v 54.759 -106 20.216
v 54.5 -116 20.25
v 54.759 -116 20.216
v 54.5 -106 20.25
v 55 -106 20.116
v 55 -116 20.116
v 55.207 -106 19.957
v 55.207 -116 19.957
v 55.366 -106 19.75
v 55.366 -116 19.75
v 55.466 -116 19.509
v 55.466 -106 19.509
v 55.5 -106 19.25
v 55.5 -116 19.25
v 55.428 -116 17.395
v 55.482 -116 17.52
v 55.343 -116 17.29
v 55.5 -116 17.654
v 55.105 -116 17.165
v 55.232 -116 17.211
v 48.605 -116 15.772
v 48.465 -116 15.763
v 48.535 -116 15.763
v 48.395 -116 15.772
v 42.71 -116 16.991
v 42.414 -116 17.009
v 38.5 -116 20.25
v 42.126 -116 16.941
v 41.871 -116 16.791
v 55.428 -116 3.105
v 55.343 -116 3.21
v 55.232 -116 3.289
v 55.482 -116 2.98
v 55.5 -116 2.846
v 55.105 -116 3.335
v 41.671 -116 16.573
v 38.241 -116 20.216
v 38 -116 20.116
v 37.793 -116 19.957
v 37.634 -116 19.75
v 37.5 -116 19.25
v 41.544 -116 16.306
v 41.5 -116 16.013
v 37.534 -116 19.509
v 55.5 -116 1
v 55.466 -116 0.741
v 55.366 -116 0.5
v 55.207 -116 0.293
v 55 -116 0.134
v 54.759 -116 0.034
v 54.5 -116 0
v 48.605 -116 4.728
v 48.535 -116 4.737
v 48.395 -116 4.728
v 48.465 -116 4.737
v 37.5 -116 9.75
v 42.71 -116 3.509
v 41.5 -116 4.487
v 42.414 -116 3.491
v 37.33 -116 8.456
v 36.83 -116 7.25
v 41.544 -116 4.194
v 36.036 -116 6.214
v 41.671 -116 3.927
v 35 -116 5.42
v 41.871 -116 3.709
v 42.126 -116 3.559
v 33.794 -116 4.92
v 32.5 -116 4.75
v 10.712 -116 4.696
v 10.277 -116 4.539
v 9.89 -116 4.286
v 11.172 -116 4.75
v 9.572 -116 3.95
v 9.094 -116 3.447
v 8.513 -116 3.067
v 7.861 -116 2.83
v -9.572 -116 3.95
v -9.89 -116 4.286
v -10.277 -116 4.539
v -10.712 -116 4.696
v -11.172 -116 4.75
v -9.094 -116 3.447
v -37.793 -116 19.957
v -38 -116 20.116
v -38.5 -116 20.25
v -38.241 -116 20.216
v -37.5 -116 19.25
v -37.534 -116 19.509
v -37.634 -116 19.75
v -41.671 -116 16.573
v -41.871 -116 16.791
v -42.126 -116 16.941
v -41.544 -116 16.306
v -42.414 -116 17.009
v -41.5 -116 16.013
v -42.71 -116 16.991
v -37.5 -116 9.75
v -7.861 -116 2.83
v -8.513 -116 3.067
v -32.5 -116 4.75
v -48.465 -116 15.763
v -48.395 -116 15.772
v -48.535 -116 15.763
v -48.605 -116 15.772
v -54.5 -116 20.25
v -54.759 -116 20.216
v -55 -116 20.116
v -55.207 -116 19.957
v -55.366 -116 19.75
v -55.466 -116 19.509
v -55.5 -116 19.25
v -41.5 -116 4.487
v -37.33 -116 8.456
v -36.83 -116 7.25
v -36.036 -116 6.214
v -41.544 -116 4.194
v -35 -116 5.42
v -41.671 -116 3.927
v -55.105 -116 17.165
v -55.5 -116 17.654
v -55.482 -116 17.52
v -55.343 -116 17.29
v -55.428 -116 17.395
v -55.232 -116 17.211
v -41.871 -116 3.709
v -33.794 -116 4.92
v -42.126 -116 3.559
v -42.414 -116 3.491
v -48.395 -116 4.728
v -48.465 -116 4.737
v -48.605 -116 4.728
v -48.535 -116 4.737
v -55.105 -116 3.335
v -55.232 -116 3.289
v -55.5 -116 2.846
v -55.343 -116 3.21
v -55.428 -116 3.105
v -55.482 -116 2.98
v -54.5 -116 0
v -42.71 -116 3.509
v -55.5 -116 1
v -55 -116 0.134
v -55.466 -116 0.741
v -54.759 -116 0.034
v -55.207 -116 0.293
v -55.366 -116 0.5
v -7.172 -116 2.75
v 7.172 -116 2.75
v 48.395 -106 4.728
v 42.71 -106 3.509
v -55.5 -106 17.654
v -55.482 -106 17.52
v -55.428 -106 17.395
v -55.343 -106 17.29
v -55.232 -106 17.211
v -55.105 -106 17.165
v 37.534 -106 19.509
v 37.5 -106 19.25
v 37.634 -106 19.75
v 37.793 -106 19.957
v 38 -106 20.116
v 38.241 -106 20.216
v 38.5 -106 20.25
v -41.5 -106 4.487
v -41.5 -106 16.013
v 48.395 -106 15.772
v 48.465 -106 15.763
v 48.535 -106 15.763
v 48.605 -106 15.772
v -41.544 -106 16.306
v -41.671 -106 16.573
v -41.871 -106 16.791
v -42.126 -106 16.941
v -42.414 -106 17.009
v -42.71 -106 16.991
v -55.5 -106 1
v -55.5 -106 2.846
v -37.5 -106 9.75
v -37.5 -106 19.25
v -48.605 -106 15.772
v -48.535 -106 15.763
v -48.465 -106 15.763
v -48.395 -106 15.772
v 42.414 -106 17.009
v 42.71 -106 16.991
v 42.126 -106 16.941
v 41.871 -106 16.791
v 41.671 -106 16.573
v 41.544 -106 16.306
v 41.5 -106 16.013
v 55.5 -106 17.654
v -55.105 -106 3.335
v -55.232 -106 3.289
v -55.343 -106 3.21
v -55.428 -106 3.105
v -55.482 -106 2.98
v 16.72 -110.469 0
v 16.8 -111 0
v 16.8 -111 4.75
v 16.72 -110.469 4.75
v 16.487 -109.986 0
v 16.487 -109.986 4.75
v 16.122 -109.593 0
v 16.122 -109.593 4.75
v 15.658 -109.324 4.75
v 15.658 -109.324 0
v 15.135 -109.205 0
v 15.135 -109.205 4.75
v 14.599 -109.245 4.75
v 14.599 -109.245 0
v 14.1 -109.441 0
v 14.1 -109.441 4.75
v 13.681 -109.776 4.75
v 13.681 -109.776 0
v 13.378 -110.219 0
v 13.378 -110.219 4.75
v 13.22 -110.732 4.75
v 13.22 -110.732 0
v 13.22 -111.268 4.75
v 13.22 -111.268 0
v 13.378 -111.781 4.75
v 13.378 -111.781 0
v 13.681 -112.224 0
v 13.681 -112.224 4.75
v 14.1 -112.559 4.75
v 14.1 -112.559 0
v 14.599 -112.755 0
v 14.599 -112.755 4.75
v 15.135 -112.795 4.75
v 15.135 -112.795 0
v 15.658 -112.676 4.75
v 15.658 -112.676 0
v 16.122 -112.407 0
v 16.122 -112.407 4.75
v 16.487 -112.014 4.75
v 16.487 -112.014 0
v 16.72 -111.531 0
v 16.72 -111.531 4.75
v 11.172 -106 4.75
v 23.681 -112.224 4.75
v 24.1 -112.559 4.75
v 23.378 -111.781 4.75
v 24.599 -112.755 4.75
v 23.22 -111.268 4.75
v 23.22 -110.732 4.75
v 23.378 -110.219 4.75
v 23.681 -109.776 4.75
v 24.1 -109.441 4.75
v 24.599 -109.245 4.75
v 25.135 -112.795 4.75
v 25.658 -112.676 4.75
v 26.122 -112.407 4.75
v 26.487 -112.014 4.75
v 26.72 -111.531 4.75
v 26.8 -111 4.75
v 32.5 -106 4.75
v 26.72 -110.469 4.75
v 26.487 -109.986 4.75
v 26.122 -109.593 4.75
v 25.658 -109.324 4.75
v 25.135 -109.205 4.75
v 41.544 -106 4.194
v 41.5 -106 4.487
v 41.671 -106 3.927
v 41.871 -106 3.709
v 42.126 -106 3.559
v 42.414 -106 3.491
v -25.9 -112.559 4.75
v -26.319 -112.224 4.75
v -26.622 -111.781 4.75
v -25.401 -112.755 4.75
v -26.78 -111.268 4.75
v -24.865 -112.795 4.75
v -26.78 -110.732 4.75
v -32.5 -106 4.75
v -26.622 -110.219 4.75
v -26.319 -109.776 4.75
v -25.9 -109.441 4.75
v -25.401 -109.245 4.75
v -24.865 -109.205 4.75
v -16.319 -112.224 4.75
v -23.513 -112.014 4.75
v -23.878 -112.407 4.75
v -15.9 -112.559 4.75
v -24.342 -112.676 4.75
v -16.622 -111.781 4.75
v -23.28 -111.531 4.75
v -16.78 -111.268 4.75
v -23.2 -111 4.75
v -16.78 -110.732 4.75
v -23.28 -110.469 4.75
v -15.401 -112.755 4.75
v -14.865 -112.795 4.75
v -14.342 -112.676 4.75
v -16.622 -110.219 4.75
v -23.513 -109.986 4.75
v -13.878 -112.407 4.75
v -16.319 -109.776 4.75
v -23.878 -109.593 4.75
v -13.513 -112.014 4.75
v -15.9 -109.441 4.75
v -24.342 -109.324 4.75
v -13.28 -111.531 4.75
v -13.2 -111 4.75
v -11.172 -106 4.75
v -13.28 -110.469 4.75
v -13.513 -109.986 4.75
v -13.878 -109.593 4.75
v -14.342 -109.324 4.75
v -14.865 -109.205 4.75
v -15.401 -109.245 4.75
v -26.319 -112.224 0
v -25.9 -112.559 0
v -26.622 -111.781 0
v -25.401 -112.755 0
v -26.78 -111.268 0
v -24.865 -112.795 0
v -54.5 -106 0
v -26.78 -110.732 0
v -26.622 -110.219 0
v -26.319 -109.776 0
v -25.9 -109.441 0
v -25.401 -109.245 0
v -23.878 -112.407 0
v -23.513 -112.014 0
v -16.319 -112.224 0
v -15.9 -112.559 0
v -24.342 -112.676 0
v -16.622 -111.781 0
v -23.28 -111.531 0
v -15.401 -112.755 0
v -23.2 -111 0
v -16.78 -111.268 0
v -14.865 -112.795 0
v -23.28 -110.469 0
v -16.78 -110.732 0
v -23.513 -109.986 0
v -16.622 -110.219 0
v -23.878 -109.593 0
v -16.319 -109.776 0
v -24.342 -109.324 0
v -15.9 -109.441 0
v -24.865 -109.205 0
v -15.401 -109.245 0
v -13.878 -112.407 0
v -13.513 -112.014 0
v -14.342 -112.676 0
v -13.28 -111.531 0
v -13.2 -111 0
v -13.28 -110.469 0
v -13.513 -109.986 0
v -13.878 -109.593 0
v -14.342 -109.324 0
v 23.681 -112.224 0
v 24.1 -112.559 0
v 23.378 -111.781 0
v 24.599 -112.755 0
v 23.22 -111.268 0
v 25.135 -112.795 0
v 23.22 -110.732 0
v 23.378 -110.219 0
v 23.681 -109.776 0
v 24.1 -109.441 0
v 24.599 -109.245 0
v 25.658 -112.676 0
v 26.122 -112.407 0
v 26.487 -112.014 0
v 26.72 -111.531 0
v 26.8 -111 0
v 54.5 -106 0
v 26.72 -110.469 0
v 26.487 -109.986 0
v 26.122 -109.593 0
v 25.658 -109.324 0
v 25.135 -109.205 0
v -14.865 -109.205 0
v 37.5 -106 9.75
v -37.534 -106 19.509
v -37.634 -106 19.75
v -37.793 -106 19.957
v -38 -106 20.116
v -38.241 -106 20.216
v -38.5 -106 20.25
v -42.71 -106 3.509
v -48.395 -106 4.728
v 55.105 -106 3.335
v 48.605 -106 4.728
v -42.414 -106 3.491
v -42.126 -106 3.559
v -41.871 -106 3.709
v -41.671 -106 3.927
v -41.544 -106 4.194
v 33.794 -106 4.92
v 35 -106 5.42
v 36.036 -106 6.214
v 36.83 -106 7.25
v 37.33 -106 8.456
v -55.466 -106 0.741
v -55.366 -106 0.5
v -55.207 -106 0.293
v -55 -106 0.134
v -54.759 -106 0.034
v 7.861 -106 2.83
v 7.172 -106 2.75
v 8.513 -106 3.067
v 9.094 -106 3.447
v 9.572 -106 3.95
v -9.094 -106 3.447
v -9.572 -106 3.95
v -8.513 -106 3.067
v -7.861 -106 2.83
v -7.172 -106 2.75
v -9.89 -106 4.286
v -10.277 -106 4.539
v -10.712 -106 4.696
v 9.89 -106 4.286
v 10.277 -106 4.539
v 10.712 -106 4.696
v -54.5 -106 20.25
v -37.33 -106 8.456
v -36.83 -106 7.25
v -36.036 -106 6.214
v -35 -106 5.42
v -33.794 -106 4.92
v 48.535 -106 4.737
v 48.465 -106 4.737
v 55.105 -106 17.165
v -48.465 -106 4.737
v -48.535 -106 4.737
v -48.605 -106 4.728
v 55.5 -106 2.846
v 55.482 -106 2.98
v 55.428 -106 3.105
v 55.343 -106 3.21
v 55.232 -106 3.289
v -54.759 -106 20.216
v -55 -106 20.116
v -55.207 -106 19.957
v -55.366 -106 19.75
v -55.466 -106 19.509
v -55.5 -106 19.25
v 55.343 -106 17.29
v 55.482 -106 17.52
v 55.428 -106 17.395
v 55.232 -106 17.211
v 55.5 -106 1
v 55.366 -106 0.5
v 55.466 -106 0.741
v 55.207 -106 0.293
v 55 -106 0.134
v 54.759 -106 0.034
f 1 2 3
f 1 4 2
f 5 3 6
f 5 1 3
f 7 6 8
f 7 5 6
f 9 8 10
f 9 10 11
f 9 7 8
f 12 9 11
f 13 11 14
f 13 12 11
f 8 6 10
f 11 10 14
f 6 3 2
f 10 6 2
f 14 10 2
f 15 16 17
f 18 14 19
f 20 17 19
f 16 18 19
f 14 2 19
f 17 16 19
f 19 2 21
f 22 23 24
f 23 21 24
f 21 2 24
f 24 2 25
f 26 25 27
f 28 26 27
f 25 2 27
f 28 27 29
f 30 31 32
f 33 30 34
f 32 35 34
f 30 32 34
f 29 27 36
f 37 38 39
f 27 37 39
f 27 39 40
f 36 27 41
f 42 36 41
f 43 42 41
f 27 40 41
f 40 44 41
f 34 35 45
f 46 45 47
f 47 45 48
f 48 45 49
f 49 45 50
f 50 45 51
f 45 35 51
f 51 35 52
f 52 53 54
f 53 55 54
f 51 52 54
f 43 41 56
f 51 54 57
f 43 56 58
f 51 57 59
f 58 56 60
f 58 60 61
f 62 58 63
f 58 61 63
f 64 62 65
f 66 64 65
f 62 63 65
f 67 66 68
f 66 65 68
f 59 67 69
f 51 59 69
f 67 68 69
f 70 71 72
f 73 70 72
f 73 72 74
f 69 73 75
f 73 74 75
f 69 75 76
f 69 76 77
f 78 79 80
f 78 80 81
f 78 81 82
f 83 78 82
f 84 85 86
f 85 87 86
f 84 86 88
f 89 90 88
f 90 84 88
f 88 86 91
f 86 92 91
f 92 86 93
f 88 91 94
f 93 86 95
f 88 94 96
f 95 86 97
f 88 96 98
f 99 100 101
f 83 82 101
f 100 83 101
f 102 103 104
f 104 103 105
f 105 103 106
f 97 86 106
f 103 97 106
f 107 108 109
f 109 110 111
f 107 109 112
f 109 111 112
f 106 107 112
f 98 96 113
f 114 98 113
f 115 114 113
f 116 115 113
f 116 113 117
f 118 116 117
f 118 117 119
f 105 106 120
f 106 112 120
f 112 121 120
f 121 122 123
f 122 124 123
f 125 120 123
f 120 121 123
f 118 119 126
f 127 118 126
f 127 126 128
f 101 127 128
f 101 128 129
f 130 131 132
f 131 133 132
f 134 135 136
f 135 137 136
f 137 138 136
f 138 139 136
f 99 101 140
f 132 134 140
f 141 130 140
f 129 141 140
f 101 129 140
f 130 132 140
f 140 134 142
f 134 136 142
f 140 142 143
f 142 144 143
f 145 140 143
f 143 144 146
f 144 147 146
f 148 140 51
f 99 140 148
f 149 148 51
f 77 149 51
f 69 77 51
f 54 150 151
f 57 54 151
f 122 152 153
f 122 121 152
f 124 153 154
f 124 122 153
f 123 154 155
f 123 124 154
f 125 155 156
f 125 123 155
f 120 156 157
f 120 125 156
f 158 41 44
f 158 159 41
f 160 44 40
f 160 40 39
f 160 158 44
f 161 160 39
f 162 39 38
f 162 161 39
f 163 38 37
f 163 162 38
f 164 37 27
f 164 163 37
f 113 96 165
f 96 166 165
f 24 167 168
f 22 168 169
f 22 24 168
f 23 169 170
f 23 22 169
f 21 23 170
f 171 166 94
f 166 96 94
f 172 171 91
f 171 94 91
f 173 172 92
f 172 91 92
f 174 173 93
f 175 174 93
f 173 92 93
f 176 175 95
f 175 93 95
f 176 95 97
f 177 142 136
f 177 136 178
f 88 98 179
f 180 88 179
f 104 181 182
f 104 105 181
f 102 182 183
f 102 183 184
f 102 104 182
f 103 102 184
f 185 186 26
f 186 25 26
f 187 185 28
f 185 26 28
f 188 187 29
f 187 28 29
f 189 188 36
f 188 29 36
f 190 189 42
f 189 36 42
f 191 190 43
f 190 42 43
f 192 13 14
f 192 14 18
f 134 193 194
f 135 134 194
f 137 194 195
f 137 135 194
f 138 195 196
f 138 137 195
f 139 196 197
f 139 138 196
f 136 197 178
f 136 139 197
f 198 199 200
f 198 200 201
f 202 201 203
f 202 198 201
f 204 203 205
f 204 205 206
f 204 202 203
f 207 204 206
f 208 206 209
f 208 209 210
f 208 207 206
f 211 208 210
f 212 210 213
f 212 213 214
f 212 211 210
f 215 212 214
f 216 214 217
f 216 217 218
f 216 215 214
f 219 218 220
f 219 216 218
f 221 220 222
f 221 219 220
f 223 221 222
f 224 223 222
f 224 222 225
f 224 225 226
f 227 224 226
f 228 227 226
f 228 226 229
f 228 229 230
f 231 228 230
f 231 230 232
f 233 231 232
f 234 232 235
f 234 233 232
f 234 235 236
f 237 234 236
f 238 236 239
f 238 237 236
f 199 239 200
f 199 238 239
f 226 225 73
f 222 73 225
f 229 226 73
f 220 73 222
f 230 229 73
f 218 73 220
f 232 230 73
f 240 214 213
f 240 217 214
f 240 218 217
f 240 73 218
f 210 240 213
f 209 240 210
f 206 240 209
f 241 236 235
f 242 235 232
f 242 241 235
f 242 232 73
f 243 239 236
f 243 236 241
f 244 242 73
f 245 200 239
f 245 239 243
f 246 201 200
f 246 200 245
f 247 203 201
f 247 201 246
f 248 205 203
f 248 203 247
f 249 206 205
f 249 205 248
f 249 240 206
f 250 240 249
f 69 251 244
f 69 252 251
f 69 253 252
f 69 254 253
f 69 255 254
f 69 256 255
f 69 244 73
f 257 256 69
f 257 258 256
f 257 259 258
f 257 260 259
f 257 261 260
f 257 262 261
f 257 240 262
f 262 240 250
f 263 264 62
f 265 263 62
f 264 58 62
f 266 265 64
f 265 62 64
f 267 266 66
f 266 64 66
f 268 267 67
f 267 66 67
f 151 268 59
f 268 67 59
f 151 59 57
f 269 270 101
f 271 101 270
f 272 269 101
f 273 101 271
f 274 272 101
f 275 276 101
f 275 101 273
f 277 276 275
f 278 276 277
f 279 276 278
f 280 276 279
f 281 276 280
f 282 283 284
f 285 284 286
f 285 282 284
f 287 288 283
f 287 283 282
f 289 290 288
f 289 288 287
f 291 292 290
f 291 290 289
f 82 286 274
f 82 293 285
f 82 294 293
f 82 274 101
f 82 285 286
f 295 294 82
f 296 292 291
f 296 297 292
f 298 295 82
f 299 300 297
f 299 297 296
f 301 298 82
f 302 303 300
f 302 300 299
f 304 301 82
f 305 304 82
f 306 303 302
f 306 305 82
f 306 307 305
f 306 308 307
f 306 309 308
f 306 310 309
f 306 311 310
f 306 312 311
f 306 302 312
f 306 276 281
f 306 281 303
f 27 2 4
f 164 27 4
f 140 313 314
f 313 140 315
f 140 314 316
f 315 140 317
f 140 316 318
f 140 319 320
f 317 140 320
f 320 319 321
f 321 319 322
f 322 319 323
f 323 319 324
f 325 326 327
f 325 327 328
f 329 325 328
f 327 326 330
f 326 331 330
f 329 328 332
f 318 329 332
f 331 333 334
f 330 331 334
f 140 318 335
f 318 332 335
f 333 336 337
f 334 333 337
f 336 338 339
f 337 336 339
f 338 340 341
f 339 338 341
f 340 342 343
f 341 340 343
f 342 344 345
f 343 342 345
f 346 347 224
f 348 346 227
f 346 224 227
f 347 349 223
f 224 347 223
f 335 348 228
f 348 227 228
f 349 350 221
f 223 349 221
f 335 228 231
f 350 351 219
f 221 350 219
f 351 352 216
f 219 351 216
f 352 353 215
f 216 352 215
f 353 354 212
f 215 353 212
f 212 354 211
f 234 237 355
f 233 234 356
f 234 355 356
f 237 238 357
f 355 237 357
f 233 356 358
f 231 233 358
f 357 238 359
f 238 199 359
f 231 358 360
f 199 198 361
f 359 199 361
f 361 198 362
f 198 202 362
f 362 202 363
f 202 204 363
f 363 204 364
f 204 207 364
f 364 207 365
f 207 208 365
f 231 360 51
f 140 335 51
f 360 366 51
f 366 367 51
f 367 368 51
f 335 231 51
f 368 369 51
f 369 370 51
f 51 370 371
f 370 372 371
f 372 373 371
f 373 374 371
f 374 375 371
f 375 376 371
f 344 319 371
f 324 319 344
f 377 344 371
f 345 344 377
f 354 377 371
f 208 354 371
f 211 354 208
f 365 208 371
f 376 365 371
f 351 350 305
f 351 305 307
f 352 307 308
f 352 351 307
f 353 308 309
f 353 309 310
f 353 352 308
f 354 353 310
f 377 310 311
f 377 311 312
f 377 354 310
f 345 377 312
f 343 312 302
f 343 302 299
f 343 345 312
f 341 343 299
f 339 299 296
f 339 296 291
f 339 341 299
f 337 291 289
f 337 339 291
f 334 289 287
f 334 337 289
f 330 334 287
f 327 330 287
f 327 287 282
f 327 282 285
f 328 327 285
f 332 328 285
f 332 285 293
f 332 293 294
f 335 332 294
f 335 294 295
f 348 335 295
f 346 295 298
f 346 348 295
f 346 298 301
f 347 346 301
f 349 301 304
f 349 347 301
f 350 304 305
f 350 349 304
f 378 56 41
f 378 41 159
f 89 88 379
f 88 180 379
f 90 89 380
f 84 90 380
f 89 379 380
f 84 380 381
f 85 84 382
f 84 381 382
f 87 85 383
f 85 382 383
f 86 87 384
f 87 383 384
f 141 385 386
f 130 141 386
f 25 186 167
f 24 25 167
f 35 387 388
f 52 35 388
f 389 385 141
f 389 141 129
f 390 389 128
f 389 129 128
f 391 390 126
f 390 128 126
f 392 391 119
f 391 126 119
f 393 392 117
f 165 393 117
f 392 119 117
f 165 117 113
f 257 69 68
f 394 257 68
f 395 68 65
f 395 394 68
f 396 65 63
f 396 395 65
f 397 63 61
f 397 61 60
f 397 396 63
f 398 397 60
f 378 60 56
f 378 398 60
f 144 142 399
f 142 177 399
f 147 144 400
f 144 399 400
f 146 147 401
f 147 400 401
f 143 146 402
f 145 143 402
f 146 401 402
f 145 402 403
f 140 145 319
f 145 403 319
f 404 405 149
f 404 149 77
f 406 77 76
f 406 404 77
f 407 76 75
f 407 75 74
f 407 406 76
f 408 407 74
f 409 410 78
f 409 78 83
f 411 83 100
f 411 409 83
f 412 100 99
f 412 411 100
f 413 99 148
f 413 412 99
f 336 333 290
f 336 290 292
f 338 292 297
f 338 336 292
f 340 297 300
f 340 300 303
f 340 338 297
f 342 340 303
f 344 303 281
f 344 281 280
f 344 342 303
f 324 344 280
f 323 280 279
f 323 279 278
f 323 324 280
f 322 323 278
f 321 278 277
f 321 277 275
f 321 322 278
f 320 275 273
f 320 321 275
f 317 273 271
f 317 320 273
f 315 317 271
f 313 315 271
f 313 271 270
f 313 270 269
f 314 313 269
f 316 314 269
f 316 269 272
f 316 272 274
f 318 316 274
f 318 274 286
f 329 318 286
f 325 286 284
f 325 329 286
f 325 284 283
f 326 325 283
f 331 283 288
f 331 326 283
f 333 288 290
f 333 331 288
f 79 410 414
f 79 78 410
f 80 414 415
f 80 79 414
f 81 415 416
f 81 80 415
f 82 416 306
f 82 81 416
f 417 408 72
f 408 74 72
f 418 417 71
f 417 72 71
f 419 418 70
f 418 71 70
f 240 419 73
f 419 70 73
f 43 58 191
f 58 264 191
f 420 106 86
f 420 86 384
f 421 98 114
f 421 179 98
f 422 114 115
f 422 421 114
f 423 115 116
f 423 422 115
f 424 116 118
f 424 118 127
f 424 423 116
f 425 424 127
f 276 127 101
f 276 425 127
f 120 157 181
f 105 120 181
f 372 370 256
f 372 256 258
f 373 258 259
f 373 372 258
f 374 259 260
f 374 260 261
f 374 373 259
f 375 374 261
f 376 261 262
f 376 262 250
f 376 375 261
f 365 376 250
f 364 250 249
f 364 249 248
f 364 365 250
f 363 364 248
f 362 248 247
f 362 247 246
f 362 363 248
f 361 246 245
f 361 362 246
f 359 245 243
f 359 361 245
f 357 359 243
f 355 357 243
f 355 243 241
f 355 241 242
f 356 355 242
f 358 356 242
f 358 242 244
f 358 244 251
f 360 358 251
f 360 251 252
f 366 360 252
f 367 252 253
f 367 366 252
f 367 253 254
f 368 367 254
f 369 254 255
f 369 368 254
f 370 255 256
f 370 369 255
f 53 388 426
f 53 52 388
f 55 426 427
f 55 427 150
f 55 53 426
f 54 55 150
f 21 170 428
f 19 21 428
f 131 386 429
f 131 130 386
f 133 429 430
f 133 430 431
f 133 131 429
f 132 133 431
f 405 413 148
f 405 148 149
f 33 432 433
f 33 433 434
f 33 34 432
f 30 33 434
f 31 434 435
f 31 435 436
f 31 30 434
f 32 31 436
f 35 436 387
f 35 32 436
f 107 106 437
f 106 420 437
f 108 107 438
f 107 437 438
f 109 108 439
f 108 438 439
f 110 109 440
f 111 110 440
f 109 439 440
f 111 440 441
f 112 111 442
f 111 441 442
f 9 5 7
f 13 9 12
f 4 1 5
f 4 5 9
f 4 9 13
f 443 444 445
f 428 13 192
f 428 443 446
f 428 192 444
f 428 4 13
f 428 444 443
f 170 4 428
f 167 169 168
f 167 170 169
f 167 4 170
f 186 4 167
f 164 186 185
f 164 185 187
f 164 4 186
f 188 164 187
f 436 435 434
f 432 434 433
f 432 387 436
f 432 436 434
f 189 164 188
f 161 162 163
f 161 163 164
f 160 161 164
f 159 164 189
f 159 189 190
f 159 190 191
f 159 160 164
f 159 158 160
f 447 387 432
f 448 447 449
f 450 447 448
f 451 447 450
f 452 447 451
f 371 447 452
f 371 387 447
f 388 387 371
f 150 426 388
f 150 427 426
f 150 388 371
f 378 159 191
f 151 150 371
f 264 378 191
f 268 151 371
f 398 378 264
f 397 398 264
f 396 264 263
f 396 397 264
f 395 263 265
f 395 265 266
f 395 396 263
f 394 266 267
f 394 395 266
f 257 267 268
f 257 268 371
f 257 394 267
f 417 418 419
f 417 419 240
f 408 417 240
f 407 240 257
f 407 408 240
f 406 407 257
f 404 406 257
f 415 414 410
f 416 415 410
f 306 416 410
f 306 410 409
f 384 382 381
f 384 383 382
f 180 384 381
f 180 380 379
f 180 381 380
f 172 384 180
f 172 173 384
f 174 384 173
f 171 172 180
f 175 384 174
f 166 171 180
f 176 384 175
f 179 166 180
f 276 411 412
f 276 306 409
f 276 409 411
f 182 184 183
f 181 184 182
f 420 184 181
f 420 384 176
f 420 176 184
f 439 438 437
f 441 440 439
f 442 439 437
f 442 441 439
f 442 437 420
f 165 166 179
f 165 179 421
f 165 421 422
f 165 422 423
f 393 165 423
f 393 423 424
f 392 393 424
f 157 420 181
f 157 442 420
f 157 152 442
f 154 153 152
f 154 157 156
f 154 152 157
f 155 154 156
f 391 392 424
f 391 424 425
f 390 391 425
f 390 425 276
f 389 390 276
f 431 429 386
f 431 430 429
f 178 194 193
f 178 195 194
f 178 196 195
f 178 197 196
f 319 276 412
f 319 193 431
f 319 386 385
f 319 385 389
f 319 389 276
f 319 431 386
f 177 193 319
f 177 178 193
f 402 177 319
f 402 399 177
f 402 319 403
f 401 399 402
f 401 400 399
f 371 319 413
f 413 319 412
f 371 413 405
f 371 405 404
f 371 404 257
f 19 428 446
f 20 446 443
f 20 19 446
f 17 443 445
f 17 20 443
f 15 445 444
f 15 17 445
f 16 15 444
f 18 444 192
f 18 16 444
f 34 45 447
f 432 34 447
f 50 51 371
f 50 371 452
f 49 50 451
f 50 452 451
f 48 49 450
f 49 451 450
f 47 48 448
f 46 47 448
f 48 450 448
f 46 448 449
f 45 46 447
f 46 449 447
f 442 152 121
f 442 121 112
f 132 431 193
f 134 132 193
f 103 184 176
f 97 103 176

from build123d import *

# Parameters (mm, degrees)
SKETCH_1_W          = 111
SKETCH_1_H          = 10
SKETCH_1_R          = 1.8
EXTRUDE_1_DEPTH     = 4.75
SKETCH_2_W          = 4
SKETCH_2_H          = 10
EXTRUDE_2_DEPTH     = 15.5
SKETCH_3_W          = 4.5
SKETCH_3_H          = 10
EXTRUDE_3_DEPTH     = 14
SKETCH_4_W          = 4.5
SKETCH_4_H          = 10
EXTRUDE_4_DEPTH     = 14
FILLET_1_R          = 5
FILLET_2_R          = 1
SKETCH_5_W          = 20
SKETCH_5_H          = 2
CUT_EXTRUDE_1_DEPTH = 14
FILLET_4_R          = 3
FILLET_5_R          = 2
CUT_EXTRUDE_2_DEPTH = 200
FILLET_6_R          = 0.5
FILLET_7_R          = 1


with BuildPart() as part:
    # ｽｹｯﾁ1 → ﾎﾞｽ - 押し出し1 (new body)
    with BuildSketch(Plane.XY):
        with Locations((0, -111)):
            Rectangle(SKETCH_1_W, SKETCH_1_H)
        with Locations((25, -111)):
            Circle(SKETCH_1_R, mode=Mode.SUBTRACT)
        with Locations((15, -111)):
            Circle(SKETCH_1_R, mode=Mode.SUBTRACT)
        with Locations((-15, -111)):
            Circle(SKETCH_1_R, mode=Mode.SUBTRACT)
        with Locations((-25, -111)):
            Circle(SKETCH_1_R, mode=Mode.SUBTRACT)
    extrude(amount=EXTRUDE_1_DEPTH)

    # ｽｹｯﾁ2 → ﾎﾞｽ - 押し出し2 (add)
    with BuildSketch(Plane.XY.offset(4.75)):
        with Locations((39.5, -111)):
            Rectangle(SKETCH_2_W, SKETCH_2_H)
        with Locations((-39.5, -111)):
            Rectangle(SKETCH_2_W, SKETCH_2_H)
    extrude(amount=EXTRUDE_2_DEPTH)

    # ｽｹｯﾁ3 → ﾎﾞｽ - 押し出し3 (add)
    with BuildSketch(Plane(origin=(41.5, 0, 0), x_dir=(0, 0, -1), z_dir=(1, 0, 0))):
        with Locations((-18, -111)):
            Rectangle(SKETCH_3_W, SKETCH_3_H)
    extrude(amount=EXTRUDE_3_DEPTH)

    # ｽｹｯﾁ4 → ﾎﾞｽ - 押し出し4 (add)
    with BuildSketch(Plane.ZY.offset(41.5)):
        with Locations((18, -111)):
            Rectangle(SKETCH_4_W, SKETCH_4_H)
    extrude(amount=EXTRUDE_4_DEPTH)

    # ﾌｨﾚｯﾄ1
    fillet_1_edges = [part.edges().sort_by_distance(p)[0] for p in [
        (37.5, -111, 4.75),
        (-37.5, -111, 4.75),
    ]]
    fillet(fillet_1_edges, radius=FILLET_1_R)

    # ﾌｨﾚｯﾄ2
    fillet_2_edges = [part.edges().sort_by_distance(p)[0] for p in [
        (37.5, -111, 20.25),
        (-37.5, -111, 20.25),
        (-55.5, -111, 0),
        (55.5, -111, 20.25),
        (55.5, -111, 0),
        (-55.5, -111, 20.25),
    ]]
    fillet(fillet_2_edges, radius=FILLET_2_R)

    # ｽｹｯﾁ5 → ｶｯﾄ - 押し出し1 (cut)
    with BuildSketch(Plane(origin=(0, -106, 0), x_dir=(1, 0, 0), z_dir=(0, 1, 0))):
        with Locations((0, -3.75)):
            Rectangle(SKETCH_5_W, SKETCH_5_H)
    extrude(amount=-CUT_EXTRUDE_1_DEPTH, mode=Mode.SUBTRACT)

    # ﾌｨﾚｯﾄ4
    # the kernel refuses this fillet: 3 mm, written as the material it adds along each edge
    with BuildSketch(Plane(origin=(10, -106, 2.75), x_dir=(-1, 0, 0), z_dir=(0, -1, 0))) as fillet_4_piece_1:
        with BuildLine():
            CenterArc((2.828427125, -3), FILLET_4_R, 90, 70.528779366)
            Line((0, -2), (-0.056568542, -1.98))
            ThreePointArc((-0.056568542, -1.98), (-0.06, -1), (-0.06, 0))
            Line((-0.06, 0), (0, 0.06))
            Line((0, 0.06), (2.828427125, 0.06))
            Line((2.828427125, 0.06), (2.828427125, 0))
        make_face()
    extrude(amount=10)
    with BuildSketch(Plane(origin=(-10, -106, 2.75), x_dir=(0, 0, 1), z_dir=(0, -1, 0))) as fillet_4_piece_2:
        with BuildLine():
            CenterArc((3, -2.828427125), FILLET_4_R, 109.471220634, 70.528779366)
            Line((0, -2.828427125), (-0.06, -2.828427125))
            Line((-0.06, -2.828427125), (-0.06, 0))
            Line((-0.06, 0), (0, 0.06))
            ThreePointArc((0, 0.06), (1, 0.06), (1.98, 0.056568542))
            Line((1.98, 0.056568542), (2, 0))
        make_face()
    extrude(amount=10)

    # ﾌｨﾚｯﾄ5
    fillet_5_edges = [part.edges().sort_by_distance(p)[0] for p in [
        (-10, -111, 4.75),
        (10, -111, 4.75),
    ]]
    fillet(fillet_5_edges, radius=FILLET_5_R)

    # ｽｹｯﾁ6 → ｶｯﾄ - 押し出し2 (cut)
    with BuildSketch(Plane(origin=(0, -106, 0), x_dir=(1, 0, 0), z_dir=(0, 1, 0))):
        Polygon((-55.5, -4.75), (-48.5, -4.75), (-55.5, -3.25), align=None)
        Polygon((-41.5, -4.75), (-41.5, -3.25), (-48.5, -4.75), align=None)
        Polygon((-41.5, -15.75), (-48.5, -15.75), (-41.5, -17.25), align=None)
        Polygon((-55.5, -17.25), (-48.5, -15.75), (-55.5, -15.75), align=None)
        Polygon((55.5, -4.75), (55.5, -3.25), (48.5, -4.75), align=None)
        Polygon((41.5, -4.75), (48.5, -4.75), (41.5, -3.25), align=None)
        Polygon((55.5, -15.75), (48.5, -15.75), (55.5, -17.25), align=None)
        Polygon((41.5, -15.75), (41.5, -17.25), (48.5, -15.75), align=None)
    extrude(amount=-CUT_EXTRUDE_2_DEPTH, mode=Mode.SUBTRACT)

    # ﾌｨﾚｯﾄ6
    fillet_6_edges = [part.edges().sort_by_distance(p)[0] for p in [
        (-55.5, -111, 17.25),
        (48.5, -111, 15.75),
        (-48.5, -111, 4.75),
        (-55.5, -111, 3.25),
        (-48.5, -111, 15.75),
        (48.5, -111, 4.75),
        (55.5, -111, 3.25),
        (55.5, -111, 17.25),
    ]]
    fillet(fillet_6_edges, radius=FILLET_6_R)

    # ﾌｨﾚｯﾄ7
    fillet_7_edges = [part.edges().sort_by_distance(p)[0] for p in [
        (41.5, -111, 17.25),
        (-41.5, -111, 3.25),
        (-41.5, -111, 17.25),
        (41.5, -111, 3.25),
    ]]
    fillet(fillet_7_edges, radius=FILLET_7_R)


solid = part.part
